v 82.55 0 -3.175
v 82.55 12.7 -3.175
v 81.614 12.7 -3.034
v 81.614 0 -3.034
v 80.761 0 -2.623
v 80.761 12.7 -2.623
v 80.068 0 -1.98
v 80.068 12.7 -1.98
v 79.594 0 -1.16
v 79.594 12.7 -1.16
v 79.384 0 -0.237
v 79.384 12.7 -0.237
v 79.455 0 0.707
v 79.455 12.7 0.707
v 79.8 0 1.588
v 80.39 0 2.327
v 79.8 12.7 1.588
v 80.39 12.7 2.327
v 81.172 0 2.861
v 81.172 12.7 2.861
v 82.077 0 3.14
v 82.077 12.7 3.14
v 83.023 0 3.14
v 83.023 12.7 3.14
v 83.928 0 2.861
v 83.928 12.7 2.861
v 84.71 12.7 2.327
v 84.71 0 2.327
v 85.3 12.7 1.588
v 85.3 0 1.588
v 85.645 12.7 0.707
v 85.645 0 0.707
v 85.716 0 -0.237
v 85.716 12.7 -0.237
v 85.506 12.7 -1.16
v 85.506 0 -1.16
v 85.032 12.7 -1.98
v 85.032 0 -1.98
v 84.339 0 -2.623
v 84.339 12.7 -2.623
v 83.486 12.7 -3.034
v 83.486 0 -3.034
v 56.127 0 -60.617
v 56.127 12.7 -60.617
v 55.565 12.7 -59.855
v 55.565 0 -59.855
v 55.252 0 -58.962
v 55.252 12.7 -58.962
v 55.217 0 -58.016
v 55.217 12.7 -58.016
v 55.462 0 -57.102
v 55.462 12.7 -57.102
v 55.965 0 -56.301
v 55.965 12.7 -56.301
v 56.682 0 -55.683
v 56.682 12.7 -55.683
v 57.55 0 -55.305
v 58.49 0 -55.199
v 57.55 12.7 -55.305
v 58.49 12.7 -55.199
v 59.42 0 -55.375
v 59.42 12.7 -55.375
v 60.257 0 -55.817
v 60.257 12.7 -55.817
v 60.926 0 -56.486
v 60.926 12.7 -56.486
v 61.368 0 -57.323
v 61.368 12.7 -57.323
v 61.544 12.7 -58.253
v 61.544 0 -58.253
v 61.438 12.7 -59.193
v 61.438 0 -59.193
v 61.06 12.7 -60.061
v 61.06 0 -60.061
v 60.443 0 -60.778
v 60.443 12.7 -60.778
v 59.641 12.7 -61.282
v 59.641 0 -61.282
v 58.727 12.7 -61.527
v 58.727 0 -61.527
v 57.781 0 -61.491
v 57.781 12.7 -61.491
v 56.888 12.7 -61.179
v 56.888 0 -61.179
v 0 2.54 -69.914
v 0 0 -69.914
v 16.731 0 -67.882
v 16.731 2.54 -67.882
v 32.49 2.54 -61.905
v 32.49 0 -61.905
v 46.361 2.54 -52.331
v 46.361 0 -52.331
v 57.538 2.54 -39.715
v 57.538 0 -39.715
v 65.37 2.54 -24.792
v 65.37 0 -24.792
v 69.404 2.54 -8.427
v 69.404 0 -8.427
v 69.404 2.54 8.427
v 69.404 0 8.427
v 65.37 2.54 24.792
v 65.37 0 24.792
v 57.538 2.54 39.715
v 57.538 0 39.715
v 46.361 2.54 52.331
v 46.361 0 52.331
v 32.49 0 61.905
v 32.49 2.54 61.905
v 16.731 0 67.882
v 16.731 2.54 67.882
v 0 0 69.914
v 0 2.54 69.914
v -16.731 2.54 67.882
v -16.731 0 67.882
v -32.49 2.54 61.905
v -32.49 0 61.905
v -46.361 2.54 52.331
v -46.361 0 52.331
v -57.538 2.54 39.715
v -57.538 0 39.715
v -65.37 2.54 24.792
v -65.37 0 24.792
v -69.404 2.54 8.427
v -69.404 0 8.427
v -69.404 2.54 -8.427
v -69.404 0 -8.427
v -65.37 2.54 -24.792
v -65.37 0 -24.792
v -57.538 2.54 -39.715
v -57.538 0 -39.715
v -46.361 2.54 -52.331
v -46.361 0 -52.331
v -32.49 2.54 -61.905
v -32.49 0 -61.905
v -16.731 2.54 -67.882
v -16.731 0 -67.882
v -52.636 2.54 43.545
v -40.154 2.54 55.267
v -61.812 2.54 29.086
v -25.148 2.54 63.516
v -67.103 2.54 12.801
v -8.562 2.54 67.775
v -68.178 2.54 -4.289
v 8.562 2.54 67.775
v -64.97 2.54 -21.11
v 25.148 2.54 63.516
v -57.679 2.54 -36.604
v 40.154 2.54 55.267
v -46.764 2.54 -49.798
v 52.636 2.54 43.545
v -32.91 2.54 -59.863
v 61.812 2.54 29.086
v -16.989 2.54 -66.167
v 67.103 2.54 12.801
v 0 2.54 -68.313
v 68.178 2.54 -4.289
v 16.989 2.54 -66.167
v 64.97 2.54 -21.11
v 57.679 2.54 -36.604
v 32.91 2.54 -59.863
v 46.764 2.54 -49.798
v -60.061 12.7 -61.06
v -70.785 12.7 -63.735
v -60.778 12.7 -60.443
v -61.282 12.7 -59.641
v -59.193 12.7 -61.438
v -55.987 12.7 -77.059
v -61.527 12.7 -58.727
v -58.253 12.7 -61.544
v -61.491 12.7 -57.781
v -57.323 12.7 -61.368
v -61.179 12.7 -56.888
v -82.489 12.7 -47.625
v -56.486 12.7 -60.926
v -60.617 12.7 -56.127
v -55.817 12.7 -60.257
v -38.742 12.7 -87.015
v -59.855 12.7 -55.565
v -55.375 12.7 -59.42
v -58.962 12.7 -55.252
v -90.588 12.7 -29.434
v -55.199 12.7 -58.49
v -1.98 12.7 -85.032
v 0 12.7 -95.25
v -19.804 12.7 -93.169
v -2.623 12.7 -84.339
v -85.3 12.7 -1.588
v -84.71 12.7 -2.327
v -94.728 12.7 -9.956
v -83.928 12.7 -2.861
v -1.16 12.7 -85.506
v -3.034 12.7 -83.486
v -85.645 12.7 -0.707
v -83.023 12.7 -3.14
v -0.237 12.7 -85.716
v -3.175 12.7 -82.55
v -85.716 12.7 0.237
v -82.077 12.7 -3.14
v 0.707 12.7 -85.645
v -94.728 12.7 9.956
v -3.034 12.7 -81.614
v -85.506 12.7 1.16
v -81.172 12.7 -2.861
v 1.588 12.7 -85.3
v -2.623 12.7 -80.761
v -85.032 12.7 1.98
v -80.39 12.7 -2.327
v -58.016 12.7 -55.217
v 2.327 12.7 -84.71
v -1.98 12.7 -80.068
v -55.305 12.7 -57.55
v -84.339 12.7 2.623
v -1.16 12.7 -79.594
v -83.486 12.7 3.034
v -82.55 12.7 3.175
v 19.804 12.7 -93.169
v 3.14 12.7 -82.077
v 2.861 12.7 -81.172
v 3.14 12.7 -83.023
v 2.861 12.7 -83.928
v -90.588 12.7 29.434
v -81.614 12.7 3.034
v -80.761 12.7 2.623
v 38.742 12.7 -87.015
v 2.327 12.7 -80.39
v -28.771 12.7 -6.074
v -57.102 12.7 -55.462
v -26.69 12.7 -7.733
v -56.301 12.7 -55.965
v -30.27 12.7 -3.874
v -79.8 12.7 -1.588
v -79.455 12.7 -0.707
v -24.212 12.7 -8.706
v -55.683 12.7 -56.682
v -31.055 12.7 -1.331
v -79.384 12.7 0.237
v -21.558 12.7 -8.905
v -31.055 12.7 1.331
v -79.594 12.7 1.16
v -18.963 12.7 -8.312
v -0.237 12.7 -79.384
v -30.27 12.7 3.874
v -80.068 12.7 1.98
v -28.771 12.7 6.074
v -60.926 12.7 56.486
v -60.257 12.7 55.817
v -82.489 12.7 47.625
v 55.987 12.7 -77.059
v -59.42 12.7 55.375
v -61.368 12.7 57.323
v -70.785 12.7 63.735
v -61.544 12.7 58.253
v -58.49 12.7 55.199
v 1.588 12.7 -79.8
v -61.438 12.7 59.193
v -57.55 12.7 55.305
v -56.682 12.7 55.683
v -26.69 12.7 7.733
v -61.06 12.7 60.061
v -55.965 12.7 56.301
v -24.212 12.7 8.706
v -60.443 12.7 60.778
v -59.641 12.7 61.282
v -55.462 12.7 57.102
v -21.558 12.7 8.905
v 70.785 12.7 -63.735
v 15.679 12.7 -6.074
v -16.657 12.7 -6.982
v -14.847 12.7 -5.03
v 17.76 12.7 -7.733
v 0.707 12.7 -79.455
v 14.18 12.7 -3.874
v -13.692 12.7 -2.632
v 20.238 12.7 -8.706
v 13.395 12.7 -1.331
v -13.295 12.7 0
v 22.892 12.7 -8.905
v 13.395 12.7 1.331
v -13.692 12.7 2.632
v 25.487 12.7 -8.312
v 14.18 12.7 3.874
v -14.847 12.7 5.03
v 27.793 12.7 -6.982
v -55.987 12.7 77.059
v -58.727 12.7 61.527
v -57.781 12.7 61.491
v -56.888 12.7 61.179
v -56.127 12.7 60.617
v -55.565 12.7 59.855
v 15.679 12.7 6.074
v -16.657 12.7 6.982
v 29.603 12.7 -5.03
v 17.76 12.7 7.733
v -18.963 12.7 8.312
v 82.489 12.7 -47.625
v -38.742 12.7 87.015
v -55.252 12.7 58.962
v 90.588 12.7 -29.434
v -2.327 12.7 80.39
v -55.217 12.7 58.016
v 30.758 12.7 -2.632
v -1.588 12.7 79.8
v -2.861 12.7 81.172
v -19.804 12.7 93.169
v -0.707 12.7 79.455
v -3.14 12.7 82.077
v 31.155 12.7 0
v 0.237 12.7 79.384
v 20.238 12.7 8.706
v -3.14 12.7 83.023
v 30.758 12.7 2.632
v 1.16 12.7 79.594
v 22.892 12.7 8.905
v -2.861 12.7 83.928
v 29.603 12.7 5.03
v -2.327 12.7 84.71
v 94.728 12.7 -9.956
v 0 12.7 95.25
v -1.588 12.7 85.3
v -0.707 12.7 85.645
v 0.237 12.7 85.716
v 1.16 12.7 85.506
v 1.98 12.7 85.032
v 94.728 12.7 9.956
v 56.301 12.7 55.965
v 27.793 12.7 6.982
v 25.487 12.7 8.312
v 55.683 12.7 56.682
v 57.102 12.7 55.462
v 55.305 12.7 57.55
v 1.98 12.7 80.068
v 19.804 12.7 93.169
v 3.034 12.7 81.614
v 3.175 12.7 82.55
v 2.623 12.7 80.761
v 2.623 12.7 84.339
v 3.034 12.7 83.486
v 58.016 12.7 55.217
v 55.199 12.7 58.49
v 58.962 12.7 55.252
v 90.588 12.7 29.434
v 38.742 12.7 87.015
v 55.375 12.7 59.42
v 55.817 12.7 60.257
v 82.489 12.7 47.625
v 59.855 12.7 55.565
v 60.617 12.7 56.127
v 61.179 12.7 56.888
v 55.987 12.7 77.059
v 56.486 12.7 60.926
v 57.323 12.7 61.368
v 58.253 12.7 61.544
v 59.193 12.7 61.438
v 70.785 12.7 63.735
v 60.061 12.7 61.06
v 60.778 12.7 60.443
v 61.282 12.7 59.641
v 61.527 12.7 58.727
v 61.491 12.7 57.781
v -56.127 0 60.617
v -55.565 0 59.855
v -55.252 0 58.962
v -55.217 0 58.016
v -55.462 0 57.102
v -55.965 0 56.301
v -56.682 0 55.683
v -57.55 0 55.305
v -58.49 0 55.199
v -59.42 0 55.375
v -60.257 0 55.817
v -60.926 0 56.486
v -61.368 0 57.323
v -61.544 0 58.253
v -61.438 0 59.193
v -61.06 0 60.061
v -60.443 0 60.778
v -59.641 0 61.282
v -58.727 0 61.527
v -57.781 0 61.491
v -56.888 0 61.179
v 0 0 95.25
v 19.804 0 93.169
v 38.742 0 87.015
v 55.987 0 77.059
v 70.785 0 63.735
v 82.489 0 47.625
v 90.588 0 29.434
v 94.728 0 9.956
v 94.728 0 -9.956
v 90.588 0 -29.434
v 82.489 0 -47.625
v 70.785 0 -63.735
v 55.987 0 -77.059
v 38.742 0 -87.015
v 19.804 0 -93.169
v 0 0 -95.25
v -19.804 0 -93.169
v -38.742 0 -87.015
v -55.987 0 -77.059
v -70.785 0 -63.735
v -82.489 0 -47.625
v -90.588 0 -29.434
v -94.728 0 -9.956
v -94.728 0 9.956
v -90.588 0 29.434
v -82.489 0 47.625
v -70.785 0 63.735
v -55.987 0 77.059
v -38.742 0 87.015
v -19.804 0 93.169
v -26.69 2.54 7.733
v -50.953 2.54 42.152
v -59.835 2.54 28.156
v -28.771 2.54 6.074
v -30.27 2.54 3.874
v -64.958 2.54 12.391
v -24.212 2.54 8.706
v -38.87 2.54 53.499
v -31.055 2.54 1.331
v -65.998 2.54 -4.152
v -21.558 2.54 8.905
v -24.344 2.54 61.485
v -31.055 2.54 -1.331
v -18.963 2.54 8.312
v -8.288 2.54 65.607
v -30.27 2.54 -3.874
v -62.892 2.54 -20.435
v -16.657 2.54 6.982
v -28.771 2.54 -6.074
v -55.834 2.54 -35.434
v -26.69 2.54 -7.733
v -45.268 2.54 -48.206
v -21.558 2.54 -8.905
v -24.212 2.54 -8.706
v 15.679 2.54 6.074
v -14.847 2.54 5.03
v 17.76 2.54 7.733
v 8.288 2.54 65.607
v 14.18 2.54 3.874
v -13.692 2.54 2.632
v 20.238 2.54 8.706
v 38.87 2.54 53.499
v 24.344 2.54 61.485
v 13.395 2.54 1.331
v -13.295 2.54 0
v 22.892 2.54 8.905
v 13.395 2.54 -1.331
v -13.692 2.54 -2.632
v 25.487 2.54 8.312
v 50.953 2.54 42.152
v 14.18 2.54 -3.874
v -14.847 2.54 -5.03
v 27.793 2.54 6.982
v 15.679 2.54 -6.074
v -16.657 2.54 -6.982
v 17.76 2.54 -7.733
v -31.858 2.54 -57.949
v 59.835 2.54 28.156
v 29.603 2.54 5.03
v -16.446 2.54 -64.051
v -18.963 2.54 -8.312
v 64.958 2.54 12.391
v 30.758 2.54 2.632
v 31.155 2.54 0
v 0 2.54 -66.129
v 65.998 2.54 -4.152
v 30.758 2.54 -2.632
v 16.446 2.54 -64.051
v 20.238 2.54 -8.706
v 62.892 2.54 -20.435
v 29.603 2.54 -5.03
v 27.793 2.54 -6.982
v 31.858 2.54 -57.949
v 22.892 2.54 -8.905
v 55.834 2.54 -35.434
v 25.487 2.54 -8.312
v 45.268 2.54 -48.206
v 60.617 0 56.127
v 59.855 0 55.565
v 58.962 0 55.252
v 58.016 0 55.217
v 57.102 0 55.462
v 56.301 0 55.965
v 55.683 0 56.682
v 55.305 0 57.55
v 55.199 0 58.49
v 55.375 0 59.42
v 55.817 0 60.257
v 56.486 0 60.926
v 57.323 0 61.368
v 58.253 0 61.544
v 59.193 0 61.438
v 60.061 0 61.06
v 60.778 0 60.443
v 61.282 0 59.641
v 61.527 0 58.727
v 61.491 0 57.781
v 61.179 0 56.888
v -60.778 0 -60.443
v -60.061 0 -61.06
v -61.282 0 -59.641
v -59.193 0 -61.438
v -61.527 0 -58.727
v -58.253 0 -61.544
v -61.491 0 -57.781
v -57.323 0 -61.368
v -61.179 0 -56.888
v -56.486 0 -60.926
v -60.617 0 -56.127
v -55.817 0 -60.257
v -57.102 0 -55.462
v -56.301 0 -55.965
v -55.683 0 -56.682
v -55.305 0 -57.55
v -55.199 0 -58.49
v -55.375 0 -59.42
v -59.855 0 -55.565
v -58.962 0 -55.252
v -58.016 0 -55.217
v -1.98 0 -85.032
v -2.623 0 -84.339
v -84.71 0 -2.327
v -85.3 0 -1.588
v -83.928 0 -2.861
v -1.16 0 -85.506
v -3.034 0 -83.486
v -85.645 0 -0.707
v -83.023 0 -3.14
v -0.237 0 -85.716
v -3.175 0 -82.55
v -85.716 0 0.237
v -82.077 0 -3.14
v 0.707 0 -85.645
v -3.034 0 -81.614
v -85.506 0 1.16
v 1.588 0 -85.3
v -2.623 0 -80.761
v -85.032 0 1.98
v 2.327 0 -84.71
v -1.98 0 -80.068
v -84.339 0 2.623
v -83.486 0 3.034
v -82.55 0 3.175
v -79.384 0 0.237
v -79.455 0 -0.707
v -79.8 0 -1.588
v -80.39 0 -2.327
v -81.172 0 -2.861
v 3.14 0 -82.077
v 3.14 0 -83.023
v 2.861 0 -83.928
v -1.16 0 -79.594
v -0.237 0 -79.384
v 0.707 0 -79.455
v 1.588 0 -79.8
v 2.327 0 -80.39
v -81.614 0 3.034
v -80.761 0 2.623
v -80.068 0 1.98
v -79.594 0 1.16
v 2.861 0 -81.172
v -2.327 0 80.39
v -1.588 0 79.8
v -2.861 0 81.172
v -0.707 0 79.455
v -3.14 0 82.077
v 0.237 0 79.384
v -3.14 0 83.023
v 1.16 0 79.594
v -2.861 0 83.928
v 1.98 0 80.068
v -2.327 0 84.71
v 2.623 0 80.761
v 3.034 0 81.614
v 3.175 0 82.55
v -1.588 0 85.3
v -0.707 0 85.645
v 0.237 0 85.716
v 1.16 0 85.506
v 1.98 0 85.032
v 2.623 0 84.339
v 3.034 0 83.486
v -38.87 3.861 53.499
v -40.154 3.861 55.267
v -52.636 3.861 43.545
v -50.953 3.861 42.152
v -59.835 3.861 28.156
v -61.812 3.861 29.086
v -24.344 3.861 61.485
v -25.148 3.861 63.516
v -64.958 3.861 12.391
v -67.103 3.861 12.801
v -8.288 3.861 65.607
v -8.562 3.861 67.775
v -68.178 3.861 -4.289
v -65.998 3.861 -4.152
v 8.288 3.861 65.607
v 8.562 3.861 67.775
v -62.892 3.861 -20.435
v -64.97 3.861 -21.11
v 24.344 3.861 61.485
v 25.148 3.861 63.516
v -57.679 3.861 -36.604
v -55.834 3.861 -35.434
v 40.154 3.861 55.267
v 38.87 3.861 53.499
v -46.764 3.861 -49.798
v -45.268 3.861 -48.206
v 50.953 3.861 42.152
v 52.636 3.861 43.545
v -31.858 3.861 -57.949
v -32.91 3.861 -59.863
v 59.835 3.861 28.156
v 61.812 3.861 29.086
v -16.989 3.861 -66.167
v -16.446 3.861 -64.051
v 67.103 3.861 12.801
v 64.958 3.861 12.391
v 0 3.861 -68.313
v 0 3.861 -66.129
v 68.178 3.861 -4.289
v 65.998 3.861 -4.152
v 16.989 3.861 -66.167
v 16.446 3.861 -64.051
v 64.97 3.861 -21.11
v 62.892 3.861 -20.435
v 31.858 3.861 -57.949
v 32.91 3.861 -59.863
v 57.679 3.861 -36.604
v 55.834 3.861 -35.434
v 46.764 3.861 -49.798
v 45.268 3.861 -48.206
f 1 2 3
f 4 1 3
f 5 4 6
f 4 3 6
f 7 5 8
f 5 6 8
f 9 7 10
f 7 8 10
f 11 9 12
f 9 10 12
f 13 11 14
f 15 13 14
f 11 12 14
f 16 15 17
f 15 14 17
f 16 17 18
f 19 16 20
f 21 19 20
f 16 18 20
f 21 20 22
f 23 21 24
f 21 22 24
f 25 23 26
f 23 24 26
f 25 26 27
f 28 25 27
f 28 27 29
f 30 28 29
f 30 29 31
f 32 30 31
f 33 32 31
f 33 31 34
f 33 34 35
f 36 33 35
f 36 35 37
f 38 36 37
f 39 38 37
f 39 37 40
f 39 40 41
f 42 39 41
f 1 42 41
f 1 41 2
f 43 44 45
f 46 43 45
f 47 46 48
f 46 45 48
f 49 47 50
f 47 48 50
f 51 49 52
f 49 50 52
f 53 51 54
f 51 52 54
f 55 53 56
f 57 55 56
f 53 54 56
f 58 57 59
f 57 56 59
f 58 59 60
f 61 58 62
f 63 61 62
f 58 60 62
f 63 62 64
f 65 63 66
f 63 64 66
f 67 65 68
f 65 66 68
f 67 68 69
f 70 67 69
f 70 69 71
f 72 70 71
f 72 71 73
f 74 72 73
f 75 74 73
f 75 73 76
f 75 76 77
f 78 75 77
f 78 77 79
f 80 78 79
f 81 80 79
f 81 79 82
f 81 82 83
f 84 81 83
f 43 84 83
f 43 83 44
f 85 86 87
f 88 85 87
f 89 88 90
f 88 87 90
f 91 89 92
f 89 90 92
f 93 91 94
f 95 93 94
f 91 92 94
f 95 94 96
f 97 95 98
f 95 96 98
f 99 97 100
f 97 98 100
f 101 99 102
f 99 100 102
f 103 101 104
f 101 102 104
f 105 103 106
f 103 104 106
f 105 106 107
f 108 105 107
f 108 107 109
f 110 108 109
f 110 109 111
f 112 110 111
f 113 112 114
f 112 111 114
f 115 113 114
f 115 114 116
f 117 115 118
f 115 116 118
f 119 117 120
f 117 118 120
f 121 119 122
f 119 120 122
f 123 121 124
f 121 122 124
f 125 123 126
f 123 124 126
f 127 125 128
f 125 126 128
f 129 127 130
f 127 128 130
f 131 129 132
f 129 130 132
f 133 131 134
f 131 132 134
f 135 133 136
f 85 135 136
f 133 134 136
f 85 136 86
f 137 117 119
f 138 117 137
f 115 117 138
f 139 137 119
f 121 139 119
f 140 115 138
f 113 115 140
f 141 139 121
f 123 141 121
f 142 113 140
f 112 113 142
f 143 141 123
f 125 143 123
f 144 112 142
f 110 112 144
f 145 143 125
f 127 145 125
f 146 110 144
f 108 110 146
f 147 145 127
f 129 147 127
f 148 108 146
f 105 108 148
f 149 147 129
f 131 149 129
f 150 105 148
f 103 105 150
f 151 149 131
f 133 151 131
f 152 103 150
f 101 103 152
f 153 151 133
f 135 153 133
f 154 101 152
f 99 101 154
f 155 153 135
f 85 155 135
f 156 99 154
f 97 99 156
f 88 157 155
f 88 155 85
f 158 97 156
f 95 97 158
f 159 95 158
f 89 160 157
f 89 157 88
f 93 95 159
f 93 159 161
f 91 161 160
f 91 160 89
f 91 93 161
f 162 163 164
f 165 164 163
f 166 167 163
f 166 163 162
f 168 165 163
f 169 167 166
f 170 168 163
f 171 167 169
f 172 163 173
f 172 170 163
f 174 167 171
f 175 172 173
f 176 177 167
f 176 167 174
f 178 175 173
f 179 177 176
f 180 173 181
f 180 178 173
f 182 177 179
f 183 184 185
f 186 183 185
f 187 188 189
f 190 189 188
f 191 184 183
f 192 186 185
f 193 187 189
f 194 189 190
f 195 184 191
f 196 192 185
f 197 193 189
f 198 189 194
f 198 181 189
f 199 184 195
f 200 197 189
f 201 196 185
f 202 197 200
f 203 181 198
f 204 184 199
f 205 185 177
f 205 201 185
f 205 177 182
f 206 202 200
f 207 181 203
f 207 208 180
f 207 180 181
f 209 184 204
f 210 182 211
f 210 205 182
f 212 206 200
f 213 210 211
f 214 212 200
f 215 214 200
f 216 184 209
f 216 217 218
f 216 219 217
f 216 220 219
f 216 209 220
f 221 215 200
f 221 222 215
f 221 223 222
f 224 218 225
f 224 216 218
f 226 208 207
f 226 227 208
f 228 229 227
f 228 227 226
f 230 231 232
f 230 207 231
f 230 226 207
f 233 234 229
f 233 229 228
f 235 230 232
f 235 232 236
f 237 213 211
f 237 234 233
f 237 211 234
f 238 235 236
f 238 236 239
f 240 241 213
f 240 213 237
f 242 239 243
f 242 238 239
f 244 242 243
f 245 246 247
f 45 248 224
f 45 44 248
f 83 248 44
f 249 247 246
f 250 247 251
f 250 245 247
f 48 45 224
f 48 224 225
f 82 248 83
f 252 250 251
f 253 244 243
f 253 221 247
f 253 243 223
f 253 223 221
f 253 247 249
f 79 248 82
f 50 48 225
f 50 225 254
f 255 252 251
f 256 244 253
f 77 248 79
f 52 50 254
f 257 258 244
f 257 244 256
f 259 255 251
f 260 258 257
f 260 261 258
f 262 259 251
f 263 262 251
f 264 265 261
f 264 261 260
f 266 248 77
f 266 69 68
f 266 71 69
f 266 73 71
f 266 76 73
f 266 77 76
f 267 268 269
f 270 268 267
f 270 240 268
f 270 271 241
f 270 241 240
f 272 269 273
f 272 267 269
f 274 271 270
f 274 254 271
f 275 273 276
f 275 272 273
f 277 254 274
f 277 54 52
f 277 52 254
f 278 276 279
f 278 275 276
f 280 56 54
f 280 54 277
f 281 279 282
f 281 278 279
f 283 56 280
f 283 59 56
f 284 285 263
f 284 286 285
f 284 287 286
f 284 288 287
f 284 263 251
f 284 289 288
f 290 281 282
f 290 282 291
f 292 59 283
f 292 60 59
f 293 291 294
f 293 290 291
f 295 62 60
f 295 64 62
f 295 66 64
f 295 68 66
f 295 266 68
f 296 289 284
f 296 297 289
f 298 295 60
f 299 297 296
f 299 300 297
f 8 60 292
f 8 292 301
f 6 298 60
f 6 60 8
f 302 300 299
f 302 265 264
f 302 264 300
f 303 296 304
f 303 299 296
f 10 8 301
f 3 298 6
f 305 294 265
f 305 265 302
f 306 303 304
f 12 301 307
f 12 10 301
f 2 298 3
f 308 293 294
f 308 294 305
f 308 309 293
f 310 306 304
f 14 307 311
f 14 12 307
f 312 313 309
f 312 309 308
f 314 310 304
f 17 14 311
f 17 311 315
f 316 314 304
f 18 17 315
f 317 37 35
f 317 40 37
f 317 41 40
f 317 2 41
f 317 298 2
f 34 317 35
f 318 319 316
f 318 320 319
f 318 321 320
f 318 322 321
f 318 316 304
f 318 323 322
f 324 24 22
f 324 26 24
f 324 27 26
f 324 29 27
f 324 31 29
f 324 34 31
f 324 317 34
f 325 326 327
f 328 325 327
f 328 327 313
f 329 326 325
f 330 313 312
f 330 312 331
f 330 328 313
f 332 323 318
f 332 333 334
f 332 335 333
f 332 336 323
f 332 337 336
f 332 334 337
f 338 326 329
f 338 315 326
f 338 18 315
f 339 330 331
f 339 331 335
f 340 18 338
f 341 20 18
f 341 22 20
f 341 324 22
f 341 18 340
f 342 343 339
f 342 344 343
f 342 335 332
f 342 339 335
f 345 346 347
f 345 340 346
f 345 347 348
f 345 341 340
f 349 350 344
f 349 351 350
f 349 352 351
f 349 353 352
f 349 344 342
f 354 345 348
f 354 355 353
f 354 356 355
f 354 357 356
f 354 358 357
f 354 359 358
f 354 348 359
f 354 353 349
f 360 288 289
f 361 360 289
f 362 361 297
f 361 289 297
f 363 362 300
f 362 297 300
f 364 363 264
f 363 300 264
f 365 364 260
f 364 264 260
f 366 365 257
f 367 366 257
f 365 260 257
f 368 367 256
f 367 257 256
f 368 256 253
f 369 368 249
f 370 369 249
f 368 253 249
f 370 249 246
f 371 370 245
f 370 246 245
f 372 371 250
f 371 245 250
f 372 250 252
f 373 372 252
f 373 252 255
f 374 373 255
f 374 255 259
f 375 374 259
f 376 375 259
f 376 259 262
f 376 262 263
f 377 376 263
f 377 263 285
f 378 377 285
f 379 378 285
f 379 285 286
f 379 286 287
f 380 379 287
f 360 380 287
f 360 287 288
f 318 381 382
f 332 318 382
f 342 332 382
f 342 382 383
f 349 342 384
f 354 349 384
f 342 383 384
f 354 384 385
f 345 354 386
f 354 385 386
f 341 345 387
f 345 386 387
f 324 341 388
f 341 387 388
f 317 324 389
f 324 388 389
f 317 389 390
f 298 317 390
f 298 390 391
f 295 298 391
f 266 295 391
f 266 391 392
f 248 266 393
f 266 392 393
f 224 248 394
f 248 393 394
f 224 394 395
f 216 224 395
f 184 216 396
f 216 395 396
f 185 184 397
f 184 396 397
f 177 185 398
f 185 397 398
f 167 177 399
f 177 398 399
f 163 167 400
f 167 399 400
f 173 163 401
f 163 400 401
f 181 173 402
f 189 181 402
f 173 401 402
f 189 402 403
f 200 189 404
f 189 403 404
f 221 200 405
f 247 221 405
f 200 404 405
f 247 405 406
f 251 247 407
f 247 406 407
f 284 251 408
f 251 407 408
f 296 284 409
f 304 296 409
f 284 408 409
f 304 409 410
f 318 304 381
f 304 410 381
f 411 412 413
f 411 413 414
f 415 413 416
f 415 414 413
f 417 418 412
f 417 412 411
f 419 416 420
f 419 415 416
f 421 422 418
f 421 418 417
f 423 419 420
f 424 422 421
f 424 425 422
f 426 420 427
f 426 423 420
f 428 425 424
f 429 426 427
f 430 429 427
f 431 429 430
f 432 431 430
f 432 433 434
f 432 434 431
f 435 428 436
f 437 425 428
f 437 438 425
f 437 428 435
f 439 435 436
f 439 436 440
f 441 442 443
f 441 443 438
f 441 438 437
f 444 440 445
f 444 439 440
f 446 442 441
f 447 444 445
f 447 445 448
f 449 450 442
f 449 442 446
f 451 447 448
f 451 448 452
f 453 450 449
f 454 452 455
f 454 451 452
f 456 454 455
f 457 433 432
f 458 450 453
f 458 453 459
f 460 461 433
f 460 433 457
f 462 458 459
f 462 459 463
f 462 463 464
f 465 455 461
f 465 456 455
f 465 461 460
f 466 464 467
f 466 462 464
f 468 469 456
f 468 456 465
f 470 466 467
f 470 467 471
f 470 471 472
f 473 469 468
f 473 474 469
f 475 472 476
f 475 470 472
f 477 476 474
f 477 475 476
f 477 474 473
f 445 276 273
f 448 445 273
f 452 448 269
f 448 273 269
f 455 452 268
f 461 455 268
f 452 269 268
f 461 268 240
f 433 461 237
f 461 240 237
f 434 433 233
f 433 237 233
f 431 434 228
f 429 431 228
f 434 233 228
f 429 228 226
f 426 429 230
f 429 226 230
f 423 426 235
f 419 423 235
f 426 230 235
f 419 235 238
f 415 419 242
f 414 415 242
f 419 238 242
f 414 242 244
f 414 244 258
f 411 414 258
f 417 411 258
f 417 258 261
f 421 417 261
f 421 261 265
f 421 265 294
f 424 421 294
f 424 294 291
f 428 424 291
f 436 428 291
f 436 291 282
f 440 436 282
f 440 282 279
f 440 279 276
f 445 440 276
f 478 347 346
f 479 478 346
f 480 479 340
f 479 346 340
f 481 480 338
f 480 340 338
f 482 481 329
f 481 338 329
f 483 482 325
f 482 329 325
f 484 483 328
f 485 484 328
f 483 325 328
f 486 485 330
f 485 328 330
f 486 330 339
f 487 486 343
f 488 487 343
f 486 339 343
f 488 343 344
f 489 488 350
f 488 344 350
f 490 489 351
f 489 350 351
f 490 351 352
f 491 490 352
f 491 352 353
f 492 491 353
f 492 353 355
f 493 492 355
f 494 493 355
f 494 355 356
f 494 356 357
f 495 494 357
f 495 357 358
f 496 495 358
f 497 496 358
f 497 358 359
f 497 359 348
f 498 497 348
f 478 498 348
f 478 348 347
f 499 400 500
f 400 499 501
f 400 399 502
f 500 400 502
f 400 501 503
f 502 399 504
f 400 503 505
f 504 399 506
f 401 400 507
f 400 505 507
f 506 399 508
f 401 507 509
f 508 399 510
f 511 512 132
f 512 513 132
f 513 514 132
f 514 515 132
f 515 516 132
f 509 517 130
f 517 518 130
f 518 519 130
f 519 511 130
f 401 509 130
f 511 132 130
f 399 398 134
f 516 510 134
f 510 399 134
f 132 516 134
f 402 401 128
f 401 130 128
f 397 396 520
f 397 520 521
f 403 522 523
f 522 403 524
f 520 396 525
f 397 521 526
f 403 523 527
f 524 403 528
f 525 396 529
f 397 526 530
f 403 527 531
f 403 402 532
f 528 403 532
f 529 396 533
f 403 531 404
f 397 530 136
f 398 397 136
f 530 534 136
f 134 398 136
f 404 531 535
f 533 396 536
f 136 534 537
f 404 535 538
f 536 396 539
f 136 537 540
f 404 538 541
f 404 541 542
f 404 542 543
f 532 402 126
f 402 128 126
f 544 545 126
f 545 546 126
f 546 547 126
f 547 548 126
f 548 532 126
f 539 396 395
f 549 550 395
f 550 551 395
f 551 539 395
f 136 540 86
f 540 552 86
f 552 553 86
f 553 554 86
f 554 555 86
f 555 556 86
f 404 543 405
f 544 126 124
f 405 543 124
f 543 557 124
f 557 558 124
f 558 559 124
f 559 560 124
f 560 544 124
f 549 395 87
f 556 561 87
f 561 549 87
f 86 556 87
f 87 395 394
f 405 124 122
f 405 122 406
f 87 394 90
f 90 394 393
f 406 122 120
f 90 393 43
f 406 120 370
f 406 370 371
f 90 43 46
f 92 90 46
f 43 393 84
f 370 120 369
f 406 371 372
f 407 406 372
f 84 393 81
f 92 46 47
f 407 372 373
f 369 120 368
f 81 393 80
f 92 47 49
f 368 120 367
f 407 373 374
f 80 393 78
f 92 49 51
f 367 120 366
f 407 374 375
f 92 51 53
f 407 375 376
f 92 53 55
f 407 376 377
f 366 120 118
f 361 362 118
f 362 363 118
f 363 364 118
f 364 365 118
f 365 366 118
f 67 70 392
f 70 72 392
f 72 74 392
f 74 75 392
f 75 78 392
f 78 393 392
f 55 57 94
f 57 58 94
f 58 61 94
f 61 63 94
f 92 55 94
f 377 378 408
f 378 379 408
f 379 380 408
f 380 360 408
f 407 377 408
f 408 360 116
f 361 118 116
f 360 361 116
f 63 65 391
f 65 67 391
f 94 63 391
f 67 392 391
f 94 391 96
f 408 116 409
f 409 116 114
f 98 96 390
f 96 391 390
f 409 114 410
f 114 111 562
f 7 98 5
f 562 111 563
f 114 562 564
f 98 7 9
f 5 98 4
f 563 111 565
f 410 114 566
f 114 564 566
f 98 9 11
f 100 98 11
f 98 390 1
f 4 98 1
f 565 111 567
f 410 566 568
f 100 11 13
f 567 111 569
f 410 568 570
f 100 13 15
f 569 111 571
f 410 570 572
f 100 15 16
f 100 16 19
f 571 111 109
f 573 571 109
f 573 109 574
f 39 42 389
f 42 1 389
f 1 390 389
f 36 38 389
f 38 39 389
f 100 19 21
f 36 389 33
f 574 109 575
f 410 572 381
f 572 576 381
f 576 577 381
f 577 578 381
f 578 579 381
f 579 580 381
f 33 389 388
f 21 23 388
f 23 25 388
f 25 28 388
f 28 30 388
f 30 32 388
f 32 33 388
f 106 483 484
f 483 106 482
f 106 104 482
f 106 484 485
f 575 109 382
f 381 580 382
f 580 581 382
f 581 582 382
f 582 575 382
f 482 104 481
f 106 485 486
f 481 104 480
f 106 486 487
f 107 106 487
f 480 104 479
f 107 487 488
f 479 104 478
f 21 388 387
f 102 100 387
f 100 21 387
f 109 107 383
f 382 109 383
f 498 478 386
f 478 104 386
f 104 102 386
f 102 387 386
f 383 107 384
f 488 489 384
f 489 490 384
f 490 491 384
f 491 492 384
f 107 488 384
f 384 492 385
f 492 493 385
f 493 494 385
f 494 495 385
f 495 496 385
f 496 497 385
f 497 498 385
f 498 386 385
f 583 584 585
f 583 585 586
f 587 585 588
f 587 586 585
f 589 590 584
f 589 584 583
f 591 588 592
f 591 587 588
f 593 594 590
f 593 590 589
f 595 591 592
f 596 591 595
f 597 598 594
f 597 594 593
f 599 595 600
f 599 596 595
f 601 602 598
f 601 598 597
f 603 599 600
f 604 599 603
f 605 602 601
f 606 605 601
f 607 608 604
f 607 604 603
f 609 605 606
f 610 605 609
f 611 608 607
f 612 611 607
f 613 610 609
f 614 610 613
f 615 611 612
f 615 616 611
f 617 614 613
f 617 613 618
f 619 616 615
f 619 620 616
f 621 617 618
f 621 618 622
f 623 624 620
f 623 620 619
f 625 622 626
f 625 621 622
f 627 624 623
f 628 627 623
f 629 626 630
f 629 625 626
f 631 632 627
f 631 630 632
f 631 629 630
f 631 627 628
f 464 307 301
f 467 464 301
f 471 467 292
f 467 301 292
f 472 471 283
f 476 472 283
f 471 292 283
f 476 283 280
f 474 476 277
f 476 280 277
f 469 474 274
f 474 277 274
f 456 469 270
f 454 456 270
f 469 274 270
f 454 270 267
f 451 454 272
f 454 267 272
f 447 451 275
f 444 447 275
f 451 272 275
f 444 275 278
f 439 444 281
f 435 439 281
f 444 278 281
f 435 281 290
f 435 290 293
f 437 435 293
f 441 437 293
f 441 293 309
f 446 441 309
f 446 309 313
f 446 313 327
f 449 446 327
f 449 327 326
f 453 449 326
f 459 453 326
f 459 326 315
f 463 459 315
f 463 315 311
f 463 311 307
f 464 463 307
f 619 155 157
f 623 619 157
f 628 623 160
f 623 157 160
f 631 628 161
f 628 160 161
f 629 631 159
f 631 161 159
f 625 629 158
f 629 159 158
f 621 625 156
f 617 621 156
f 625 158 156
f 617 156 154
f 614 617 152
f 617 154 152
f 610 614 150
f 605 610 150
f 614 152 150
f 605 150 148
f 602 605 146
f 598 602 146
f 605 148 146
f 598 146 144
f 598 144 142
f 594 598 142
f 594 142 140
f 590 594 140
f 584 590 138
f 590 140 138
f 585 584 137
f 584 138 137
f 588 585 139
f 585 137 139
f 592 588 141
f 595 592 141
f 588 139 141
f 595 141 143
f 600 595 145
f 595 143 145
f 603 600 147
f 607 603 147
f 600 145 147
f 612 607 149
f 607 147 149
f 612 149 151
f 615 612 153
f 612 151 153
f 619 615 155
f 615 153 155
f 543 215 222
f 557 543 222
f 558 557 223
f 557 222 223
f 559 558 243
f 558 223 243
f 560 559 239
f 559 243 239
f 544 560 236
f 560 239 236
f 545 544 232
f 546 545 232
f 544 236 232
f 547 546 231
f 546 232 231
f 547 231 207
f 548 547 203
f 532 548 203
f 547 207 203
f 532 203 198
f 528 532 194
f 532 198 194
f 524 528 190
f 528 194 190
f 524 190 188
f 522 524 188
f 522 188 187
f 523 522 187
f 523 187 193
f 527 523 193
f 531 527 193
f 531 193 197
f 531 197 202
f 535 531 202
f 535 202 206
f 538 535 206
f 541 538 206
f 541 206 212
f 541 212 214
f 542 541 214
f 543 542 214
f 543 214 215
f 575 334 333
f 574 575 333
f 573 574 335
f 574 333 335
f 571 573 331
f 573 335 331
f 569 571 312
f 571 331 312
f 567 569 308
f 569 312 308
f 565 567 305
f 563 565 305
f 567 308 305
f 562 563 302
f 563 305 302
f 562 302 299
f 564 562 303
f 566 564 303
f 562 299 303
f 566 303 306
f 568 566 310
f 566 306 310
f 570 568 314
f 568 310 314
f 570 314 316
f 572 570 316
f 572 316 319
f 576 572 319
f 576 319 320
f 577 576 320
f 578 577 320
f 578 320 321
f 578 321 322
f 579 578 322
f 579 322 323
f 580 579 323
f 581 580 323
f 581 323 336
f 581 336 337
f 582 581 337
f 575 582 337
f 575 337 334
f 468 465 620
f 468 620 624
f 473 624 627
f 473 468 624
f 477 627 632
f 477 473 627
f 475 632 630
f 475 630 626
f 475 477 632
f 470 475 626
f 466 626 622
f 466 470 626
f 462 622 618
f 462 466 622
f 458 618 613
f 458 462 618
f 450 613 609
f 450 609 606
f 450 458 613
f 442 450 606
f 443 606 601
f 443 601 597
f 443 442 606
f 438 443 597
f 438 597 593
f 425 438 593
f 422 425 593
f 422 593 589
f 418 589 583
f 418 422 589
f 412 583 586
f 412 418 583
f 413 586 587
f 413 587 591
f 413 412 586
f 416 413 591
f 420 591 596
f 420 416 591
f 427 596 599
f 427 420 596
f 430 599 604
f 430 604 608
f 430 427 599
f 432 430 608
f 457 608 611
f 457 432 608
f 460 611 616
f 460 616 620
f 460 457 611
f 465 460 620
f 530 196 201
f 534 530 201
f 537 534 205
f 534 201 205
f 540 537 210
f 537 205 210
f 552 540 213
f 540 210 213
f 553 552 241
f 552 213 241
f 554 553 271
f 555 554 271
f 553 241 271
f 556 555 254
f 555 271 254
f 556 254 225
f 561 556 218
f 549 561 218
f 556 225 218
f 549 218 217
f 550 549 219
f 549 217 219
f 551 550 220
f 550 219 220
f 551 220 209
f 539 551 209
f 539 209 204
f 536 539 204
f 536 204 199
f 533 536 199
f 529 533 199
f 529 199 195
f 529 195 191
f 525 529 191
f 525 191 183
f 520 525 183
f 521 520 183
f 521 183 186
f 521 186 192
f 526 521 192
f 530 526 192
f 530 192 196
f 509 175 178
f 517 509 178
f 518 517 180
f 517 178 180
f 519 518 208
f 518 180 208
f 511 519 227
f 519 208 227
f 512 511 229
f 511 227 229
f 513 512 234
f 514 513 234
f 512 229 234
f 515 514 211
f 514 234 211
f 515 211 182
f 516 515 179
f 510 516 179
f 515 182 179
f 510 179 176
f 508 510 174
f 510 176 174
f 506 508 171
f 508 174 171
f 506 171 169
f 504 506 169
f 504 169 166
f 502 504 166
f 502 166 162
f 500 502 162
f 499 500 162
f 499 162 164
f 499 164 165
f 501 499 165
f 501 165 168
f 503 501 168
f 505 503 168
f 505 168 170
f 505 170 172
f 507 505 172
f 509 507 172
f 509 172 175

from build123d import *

# Parameters (mm, degrees)
SKETCH1_R                            = 95.25
BOSS_EXTRUDE1_DEPTH                  = 12.7
F_1_4_0_25_DIAMETER_HOLE1_D          = 6.35
CIRPATTERN1_COUNT                    = 8
SKETCH7_R                            = 69.9135
CUT_EXTRUDE3_DEPTH                   = 2.54
SKETCH2_R                            = 68.3133
SKETCH2_R_2                          = 66.1289
CUT_EXTRUDE1_DEPTH                   = 1.3208
F_45_64_0_70313_DIAMETER_HOLE1_D     = 17.859502
F_45_64_0_70313_DIAMETER_HOLE1_DEPTH = 25.4
F_45_64_0_70313_DIAMETER_HOLE1_TIP   = 5.365535714


with BuildPart() as part:
    # Sketch1 → Boss-Extrude1 (new body)
    with BuildSketch(Plane(origin=(0, 0, 0), x_dir=(1, 0, 0), z_dir=(0, 1, 0))):
        with Locations(Location((0, 0, 0), (0, 0, 270))):
            Circle(SKETCH1_R)
    extrude(amount=BOSS_EXTRUDE1_DEPTH)

    # 1/4 (0.25) Diameter Hole1 (through all)
    with Locations(Plane(origin=(0, 0, 0), x_dir=(-1, 0, 0), z_dir=(0, -1, 0))):
        with Locations((0, -82.55)):
            f_1_4_0_25_diameter_hole1 = Hole(F_1_4_0_25_DIAMETER_HOLE1_D / 2)

    # CirPattern1: 1/4 (0.25) Diameter Hole1 ×8 about axis
    cirpattern1_axis = Axis((0, 0, 0), (0, 1, 0))
    for i in range(1, CIRPATTERN1_COUNT):
        add(f_1_4_0_25_diameter_hole1.rotate(cirpattern1_axis, i * 360 / CIRPATTERN1_COUNT), mode=Mode.SUBTRACT)

    # Sketch7 → Cut-Extrude3 (cut)
    with BuildSketch(Plane(origin=(0, 0, 0), x_dir=(-1, 0, 0), z_dir=(0, -1, 0))):
        with Locations(Location((0, 0, 0), (0, 0, 90))):
            Circle(SKETCH7_R)
    extrude(amount=-CUT_EXTRUDE3_DEPTH, mode=Mode.SUBTRACT)

    # Sketch2 → Cut-Extrude1 (cut)
    with BuildSketch(Plane.XZ.offset(-2.54)):
        with Locations(Location((0, 0, 0), (0, 0, 270))):
            Circle(SKETCH2_R)
        with Locations(Location((0, 0, 0), (0, 0, 270))):
            Circle(SKETCH2_R_2, mode=Mode.SUBTRACT)
    extrude(amount=-CUT_EXTRUDE1_DEPTH, mode=Mode.SUBTRACT)

    # 45/64 (0.70313) Diameter Hole1
    with Locations(Plane(origin=(0, 2.54, 0), x_dir=(-1, 0, 0), z_dir=(0, -1, 0))):
        with Locations((22.225, 0), (-22.225, 0)):
            Hole(F_45_64_0_70313_DIAMETER_HOLE1_D / 2, depth=F_45_64_0_70313_DIAMETER_HOLE1_DEPTH)
            with Locations((0, 0, -(F_45_64_0_70313_DIAMETER_HOLE1_DEPTH + F_45_64_0_70313_DIAMETER_HOLE1_TIP / 2))):  # 118° drill point
                Cone(0, F_45_64_0_70313_DIAMETER_HOLE1_D / 2, F_45_64_0_70313_DIAMETER_HOLE1_TIP, mode=Mode.SUBTRACT)


solid = part.part
